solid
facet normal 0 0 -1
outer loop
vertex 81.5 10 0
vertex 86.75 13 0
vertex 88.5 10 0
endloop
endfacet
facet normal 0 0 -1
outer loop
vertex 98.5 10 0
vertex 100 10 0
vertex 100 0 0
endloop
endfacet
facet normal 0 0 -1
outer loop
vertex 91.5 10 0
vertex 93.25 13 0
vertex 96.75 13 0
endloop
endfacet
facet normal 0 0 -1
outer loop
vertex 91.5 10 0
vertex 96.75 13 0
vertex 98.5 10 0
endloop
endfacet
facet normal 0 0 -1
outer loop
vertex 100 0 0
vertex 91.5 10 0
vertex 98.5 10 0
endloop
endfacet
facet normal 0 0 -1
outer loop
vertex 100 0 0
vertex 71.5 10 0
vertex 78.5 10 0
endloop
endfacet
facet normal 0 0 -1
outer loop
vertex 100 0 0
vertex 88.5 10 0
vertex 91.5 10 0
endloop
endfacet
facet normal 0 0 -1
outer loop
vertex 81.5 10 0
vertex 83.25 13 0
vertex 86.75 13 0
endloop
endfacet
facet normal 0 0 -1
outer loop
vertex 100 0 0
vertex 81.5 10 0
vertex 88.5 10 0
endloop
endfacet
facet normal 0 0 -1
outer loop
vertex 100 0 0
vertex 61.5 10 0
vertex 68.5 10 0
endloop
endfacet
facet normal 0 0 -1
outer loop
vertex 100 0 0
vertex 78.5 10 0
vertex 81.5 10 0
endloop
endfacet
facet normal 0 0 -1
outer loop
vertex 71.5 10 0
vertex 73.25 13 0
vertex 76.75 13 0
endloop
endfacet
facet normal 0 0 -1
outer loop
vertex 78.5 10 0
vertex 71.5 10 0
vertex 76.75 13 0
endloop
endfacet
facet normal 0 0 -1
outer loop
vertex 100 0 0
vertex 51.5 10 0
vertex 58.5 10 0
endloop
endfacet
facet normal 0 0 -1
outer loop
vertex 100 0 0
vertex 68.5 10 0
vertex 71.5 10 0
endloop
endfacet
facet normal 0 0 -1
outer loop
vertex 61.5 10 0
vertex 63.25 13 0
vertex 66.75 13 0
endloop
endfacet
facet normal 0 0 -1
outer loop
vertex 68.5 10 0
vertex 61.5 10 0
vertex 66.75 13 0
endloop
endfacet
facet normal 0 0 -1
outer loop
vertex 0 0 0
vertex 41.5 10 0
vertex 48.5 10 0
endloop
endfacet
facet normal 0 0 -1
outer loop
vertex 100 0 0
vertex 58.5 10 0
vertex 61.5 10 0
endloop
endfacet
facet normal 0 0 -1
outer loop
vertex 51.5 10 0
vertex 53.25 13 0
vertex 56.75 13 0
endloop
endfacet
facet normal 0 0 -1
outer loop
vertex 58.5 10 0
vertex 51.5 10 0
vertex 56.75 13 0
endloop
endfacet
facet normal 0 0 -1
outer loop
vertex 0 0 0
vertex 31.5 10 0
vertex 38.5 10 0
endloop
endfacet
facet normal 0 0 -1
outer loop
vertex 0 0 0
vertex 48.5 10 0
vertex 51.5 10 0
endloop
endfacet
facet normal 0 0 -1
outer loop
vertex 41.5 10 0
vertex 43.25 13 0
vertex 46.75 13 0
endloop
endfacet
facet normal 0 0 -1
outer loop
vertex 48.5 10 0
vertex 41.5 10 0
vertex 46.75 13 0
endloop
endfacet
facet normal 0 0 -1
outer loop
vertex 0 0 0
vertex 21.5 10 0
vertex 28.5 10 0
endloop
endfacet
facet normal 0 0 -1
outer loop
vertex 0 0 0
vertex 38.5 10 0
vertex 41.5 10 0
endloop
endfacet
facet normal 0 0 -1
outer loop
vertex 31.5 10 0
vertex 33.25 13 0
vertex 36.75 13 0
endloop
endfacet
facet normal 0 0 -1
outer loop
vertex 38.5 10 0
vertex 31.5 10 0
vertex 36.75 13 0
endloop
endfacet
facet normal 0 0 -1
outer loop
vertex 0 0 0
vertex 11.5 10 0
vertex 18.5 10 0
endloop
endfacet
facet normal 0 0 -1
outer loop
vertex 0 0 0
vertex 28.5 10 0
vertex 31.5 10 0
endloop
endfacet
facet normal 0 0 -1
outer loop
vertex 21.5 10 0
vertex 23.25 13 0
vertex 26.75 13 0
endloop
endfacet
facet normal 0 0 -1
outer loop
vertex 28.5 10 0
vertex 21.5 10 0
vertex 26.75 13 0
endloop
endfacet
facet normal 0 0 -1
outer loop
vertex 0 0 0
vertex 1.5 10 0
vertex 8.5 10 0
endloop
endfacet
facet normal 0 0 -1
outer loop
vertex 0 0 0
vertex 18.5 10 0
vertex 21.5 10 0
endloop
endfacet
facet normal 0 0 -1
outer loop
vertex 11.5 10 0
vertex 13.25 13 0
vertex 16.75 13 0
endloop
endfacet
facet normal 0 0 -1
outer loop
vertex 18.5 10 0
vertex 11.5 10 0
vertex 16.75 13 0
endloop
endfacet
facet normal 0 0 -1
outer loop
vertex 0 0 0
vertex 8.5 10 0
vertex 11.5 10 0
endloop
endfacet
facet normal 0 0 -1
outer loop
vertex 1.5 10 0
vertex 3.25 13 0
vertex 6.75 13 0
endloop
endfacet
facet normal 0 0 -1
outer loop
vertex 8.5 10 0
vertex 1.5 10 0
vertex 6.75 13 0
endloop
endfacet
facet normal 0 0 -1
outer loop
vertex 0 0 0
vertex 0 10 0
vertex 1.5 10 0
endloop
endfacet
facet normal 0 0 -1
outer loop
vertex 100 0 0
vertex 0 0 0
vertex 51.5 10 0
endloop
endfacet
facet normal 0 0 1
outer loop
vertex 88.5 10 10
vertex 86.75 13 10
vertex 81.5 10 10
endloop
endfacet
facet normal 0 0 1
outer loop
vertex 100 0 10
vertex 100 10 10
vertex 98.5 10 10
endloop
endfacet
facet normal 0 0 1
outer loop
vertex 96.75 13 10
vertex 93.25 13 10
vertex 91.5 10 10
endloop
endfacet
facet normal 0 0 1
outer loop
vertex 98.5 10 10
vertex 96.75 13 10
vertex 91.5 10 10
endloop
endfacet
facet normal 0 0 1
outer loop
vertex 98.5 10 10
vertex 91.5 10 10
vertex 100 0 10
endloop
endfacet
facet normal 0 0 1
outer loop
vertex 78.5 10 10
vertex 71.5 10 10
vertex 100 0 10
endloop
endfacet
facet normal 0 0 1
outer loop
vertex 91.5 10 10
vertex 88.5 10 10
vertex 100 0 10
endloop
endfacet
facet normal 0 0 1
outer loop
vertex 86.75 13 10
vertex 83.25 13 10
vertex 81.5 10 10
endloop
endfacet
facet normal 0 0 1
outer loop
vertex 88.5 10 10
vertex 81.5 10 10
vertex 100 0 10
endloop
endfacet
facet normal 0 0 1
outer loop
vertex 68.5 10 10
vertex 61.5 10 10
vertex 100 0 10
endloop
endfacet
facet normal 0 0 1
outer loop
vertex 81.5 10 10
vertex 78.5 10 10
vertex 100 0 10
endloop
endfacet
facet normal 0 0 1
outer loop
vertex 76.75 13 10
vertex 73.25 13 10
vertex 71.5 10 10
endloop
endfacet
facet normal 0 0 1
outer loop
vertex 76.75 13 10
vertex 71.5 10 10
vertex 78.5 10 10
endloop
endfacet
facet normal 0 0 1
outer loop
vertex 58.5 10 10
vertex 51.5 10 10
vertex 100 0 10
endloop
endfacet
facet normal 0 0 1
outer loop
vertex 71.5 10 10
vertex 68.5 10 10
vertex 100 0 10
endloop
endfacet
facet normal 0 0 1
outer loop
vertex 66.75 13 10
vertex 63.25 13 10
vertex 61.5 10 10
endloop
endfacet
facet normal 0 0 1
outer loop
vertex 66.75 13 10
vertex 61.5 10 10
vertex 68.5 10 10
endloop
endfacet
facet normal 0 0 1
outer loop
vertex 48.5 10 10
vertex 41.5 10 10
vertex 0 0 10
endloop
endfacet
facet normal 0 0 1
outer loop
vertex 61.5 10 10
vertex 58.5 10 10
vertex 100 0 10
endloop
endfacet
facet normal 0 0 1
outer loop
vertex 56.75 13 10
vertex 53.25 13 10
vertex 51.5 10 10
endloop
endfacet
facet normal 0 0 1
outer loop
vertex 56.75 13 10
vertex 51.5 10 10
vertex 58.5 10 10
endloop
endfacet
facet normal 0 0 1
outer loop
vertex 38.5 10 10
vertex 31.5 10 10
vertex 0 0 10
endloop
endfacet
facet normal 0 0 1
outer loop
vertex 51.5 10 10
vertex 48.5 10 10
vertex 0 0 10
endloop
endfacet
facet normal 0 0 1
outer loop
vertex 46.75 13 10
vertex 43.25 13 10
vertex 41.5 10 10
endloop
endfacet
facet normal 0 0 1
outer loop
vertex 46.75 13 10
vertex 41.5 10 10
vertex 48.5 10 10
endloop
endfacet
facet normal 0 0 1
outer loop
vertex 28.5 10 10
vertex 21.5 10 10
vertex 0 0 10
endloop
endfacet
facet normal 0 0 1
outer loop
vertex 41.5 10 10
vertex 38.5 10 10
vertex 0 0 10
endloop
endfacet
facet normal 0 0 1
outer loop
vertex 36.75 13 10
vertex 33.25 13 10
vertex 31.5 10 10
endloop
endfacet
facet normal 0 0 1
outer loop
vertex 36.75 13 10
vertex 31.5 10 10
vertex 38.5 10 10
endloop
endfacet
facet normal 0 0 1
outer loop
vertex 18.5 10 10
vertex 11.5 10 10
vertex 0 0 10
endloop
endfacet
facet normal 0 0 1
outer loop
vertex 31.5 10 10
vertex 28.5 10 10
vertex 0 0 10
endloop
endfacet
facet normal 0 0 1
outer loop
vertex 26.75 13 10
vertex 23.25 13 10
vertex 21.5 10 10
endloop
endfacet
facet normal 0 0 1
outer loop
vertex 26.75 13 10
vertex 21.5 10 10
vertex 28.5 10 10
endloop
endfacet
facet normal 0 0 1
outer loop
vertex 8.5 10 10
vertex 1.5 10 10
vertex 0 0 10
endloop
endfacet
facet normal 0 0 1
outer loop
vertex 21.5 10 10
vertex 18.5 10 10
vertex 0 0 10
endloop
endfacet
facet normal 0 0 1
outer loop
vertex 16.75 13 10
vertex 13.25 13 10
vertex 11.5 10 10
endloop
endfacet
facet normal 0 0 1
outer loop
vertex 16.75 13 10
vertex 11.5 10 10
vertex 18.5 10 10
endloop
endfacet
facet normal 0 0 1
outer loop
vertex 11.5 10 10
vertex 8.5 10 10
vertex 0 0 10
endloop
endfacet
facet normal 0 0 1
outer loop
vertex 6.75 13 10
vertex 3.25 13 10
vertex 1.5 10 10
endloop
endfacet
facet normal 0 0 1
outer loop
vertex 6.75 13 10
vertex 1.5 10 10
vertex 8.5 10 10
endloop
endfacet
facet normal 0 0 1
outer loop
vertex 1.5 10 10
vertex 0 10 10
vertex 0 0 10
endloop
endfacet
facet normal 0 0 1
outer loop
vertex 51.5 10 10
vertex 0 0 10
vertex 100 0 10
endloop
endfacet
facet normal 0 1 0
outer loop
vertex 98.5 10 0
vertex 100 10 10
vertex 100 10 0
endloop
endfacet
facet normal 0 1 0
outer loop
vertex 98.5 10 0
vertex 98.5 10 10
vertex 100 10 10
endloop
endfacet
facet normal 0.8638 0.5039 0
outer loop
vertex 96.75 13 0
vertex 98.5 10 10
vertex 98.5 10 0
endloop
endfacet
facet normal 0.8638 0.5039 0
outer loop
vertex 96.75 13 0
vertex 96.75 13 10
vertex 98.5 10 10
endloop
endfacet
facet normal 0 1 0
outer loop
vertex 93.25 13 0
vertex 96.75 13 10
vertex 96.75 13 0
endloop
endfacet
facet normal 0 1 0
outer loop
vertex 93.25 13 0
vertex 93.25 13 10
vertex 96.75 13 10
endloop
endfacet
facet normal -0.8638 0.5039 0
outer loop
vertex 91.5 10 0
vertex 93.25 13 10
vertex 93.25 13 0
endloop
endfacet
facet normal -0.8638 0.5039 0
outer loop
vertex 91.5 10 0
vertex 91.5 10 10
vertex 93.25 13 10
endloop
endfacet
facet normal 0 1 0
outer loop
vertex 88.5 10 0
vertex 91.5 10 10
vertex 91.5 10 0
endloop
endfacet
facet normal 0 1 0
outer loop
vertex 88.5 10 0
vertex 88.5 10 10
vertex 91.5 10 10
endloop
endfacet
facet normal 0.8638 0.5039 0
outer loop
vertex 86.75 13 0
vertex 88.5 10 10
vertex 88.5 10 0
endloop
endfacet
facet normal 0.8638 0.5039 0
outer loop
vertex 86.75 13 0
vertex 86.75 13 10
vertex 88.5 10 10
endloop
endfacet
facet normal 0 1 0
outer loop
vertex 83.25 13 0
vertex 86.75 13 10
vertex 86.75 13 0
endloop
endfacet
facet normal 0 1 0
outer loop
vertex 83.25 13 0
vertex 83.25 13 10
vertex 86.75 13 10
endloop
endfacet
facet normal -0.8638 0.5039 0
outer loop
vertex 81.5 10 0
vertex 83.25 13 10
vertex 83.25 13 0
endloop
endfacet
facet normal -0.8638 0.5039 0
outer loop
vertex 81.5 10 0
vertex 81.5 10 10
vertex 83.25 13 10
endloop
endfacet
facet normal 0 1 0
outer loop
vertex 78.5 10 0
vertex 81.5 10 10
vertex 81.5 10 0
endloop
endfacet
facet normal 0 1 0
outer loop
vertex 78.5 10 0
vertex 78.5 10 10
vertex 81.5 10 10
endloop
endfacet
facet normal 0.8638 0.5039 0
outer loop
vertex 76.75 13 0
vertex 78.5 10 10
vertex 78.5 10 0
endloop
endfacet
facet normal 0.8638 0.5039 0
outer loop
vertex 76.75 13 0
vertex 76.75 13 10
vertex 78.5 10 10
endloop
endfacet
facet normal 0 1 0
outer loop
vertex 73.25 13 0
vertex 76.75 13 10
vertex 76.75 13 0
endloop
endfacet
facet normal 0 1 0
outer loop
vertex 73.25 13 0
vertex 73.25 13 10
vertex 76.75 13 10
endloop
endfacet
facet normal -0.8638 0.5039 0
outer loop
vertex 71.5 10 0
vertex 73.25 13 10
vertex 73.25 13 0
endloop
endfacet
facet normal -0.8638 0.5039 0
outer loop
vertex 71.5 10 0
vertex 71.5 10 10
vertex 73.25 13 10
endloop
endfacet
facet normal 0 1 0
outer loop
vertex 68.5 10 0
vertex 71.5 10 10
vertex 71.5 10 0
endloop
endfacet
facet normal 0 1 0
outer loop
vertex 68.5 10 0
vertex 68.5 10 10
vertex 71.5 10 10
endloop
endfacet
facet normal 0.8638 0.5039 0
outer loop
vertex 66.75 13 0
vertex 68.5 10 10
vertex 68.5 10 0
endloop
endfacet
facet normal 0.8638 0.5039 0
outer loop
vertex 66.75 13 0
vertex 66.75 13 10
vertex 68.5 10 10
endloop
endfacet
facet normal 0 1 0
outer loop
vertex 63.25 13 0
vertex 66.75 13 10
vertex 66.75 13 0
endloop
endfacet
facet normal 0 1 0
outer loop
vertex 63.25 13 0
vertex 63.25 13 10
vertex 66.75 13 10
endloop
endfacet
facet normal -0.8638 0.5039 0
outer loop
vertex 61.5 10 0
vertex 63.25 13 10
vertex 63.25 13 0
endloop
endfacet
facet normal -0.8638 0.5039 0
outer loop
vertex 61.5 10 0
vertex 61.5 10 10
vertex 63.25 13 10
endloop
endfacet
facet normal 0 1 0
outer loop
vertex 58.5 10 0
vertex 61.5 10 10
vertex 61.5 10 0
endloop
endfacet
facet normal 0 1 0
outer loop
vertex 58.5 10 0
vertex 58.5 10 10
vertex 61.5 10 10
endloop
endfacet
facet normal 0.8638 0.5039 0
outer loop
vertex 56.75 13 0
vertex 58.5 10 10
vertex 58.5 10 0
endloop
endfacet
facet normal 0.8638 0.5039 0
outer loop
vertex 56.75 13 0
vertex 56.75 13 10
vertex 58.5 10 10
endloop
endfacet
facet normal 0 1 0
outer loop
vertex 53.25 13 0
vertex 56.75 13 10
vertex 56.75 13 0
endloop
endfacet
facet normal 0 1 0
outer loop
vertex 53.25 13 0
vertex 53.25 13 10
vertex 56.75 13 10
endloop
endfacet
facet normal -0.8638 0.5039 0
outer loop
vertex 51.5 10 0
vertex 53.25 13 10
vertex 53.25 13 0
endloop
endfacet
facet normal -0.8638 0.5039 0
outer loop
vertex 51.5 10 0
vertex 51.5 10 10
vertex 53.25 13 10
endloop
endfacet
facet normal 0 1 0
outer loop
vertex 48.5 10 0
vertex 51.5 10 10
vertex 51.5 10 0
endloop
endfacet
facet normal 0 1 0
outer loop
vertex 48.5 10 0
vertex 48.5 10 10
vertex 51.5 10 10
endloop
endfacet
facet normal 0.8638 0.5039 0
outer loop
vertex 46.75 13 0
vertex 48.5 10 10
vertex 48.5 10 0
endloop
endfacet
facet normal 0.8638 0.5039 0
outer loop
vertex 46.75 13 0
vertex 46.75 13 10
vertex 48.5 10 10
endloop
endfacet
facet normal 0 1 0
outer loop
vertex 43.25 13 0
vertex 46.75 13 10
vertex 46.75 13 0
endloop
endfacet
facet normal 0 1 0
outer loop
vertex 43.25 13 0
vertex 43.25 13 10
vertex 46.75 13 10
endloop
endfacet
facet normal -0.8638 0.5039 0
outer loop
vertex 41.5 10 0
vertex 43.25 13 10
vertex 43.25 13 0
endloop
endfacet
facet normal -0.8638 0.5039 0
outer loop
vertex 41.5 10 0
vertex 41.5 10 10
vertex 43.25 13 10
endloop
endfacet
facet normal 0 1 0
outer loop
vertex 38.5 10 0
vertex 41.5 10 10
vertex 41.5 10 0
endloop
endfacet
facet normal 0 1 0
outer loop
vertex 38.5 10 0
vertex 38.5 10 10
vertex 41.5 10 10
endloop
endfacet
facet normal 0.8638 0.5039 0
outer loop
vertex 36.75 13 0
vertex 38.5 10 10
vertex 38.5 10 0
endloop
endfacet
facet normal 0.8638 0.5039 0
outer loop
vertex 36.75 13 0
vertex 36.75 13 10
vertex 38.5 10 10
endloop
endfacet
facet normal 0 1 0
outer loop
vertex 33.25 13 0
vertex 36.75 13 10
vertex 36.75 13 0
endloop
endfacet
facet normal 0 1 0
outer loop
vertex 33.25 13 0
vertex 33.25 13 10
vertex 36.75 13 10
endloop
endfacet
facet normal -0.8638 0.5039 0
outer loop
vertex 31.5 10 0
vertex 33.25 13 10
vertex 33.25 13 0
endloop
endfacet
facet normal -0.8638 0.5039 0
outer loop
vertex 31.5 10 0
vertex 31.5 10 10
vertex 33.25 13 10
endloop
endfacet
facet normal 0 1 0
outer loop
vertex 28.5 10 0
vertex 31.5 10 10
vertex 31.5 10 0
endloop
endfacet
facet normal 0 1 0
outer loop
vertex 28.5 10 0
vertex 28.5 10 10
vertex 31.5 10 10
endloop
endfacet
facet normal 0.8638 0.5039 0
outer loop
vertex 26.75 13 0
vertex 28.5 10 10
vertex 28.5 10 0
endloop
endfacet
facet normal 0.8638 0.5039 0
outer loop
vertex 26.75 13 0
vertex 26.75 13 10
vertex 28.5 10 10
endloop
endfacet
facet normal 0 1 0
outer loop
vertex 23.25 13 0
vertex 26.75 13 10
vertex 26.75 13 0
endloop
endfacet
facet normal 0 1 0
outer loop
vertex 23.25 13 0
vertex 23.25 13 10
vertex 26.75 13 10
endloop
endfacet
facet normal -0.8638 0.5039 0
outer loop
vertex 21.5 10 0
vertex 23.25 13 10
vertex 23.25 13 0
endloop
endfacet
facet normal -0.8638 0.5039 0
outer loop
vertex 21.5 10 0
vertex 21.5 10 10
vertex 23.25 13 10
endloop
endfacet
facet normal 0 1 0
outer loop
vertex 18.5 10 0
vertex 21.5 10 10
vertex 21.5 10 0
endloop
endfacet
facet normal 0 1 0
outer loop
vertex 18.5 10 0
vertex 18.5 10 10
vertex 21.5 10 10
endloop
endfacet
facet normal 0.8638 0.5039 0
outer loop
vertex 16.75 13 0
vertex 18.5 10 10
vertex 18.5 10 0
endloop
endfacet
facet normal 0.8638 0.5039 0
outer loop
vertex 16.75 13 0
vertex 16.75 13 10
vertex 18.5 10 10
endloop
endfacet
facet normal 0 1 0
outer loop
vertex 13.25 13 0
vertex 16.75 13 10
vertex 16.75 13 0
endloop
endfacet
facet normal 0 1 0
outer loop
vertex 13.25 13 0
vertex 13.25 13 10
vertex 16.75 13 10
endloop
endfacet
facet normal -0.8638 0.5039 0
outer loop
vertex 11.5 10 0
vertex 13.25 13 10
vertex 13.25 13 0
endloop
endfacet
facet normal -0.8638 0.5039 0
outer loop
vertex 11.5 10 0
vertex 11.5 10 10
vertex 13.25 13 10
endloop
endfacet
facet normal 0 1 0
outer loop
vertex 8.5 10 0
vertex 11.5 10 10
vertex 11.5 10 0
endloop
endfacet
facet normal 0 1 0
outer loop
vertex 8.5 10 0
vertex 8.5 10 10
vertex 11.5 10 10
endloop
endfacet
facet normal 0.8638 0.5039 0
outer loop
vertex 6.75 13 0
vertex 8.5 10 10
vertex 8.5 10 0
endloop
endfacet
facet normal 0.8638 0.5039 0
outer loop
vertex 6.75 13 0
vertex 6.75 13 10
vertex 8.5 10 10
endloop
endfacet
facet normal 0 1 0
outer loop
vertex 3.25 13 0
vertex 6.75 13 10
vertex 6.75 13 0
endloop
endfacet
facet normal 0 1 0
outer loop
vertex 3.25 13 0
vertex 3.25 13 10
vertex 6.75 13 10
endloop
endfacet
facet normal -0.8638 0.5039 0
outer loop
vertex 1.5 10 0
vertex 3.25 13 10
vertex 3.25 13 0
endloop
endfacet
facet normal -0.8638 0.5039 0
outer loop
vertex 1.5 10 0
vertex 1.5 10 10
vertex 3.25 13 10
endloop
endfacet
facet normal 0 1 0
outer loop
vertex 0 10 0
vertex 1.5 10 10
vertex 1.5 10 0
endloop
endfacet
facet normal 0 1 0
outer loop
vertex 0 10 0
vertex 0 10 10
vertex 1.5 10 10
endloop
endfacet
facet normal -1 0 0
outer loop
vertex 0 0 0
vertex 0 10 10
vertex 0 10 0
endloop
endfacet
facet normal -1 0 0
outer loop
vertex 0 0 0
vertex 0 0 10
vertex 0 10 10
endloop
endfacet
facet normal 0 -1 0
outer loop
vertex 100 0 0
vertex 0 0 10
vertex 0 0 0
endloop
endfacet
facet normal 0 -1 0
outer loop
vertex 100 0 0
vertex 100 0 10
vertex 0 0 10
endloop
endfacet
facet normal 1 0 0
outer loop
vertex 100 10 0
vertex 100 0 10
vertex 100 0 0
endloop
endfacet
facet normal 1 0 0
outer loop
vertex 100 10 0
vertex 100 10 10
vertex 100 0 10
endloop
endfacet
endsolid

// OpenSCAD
$fn = 32;

// ----------------------------------------------------------------------
// Gear rack: 10 teeth, pitch 10 mm
// ----------------------------------------------------------------------

// --- parameters (mm) ---
teeth = 10;               // number of teeth
pitch = 10;               // tooth pitch, X
root_w = 7;               // tooth width at the root
tip_w = 3.5;              // tooth width at the tip
base_h = 10;              // rack body height, Y
tooth_h = 3;              // tooth height above the body
plate_t = 10;             // rack width, Z (extrusion height)

rack_l = teeth * pitch;  // overall length
total_h = base_h + tooth_h;  // overall height

profile = [[0, 0], [100, 0], [100, 10], [98.5, 10], [96.75, 13], [93.25, 13], [91.5, 10], [88.5, 10], [86.75, 13], [83.25, 13], [81.5, 10], [78.5, 10], [76.75, 13], [73.25, 13], [71.5, 10], [68.5, 10], [66.75, 13], [63.25, 13], [61.5, 10], [58.5, 10], [56.75, 13], [53.25, 13], [51.5, 10], [48.5, 10], [46.75, 13], [43.25, 13], [41.5, 10], [38.5, 10], [36.75, 13], [33.25, 13], [31.5, 10], [28.5, 10], [26.75, 13], [23.25, 13], [21.5, 10], [18.5, 10], [16.75, 13], [13.25, 13], [11.5, 10], [8.5, 10], [6.75, 13], [3.25, 13], [1.5, 10], [0, 10]];  // primary outline, 44 points, counter clockwise

// --- the one profile operation ---
linear_extrude(height = plate_t) polygon(points = profile);
